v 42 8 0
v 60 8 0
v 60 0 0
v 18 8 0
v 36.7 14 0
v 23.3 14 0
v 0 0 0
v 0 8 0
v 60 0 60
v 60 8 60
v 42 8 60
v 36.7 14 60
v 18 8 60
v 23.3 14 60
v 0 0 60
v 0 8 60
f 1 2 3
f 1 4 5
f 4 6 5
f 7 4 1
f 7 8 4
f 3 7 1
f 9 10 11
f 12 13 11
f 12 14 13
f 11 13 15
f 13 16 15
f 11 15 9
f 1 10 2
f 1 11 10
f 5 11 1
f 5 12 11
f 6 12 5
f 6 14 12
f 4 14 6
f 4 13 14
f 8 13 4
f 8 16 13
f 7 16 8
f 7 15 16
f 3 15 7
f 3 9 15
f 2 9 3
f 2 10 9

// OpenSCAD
$fn = 32;

// ----------------------------------------------------------------------
// V guide rail: dovetail, 60 mm wide
// ----------------------------------------------------------------------

// --- parameters (mm) ---
rail_w = 60;              // rail width, X
base_t = 8;               // base plate thickness
v_depth = 6;              // V feature depth / height
v_half_w = 12;            // half width of the V at the base face
plate_t = 60;             // rail length, Z (the extrusion height)
top_half_w = 6.7;         // half width at the dovetail top

dovetail_base = 2 * v_half_w;  // dovetail width at the base
dovetail_top = 2 * top_half_w;  // dovetail width at the top

profile = [[0, 0], [60, 0], [60, 8], [42, 8], [36.7, 14], [23.3, 14], [18, 8], [0, 8]];  // primary outline, 8 points, counter clockwise

// --- the one profile operation ---
linear_extrude(height = plate_t) polygon(points = profile);
